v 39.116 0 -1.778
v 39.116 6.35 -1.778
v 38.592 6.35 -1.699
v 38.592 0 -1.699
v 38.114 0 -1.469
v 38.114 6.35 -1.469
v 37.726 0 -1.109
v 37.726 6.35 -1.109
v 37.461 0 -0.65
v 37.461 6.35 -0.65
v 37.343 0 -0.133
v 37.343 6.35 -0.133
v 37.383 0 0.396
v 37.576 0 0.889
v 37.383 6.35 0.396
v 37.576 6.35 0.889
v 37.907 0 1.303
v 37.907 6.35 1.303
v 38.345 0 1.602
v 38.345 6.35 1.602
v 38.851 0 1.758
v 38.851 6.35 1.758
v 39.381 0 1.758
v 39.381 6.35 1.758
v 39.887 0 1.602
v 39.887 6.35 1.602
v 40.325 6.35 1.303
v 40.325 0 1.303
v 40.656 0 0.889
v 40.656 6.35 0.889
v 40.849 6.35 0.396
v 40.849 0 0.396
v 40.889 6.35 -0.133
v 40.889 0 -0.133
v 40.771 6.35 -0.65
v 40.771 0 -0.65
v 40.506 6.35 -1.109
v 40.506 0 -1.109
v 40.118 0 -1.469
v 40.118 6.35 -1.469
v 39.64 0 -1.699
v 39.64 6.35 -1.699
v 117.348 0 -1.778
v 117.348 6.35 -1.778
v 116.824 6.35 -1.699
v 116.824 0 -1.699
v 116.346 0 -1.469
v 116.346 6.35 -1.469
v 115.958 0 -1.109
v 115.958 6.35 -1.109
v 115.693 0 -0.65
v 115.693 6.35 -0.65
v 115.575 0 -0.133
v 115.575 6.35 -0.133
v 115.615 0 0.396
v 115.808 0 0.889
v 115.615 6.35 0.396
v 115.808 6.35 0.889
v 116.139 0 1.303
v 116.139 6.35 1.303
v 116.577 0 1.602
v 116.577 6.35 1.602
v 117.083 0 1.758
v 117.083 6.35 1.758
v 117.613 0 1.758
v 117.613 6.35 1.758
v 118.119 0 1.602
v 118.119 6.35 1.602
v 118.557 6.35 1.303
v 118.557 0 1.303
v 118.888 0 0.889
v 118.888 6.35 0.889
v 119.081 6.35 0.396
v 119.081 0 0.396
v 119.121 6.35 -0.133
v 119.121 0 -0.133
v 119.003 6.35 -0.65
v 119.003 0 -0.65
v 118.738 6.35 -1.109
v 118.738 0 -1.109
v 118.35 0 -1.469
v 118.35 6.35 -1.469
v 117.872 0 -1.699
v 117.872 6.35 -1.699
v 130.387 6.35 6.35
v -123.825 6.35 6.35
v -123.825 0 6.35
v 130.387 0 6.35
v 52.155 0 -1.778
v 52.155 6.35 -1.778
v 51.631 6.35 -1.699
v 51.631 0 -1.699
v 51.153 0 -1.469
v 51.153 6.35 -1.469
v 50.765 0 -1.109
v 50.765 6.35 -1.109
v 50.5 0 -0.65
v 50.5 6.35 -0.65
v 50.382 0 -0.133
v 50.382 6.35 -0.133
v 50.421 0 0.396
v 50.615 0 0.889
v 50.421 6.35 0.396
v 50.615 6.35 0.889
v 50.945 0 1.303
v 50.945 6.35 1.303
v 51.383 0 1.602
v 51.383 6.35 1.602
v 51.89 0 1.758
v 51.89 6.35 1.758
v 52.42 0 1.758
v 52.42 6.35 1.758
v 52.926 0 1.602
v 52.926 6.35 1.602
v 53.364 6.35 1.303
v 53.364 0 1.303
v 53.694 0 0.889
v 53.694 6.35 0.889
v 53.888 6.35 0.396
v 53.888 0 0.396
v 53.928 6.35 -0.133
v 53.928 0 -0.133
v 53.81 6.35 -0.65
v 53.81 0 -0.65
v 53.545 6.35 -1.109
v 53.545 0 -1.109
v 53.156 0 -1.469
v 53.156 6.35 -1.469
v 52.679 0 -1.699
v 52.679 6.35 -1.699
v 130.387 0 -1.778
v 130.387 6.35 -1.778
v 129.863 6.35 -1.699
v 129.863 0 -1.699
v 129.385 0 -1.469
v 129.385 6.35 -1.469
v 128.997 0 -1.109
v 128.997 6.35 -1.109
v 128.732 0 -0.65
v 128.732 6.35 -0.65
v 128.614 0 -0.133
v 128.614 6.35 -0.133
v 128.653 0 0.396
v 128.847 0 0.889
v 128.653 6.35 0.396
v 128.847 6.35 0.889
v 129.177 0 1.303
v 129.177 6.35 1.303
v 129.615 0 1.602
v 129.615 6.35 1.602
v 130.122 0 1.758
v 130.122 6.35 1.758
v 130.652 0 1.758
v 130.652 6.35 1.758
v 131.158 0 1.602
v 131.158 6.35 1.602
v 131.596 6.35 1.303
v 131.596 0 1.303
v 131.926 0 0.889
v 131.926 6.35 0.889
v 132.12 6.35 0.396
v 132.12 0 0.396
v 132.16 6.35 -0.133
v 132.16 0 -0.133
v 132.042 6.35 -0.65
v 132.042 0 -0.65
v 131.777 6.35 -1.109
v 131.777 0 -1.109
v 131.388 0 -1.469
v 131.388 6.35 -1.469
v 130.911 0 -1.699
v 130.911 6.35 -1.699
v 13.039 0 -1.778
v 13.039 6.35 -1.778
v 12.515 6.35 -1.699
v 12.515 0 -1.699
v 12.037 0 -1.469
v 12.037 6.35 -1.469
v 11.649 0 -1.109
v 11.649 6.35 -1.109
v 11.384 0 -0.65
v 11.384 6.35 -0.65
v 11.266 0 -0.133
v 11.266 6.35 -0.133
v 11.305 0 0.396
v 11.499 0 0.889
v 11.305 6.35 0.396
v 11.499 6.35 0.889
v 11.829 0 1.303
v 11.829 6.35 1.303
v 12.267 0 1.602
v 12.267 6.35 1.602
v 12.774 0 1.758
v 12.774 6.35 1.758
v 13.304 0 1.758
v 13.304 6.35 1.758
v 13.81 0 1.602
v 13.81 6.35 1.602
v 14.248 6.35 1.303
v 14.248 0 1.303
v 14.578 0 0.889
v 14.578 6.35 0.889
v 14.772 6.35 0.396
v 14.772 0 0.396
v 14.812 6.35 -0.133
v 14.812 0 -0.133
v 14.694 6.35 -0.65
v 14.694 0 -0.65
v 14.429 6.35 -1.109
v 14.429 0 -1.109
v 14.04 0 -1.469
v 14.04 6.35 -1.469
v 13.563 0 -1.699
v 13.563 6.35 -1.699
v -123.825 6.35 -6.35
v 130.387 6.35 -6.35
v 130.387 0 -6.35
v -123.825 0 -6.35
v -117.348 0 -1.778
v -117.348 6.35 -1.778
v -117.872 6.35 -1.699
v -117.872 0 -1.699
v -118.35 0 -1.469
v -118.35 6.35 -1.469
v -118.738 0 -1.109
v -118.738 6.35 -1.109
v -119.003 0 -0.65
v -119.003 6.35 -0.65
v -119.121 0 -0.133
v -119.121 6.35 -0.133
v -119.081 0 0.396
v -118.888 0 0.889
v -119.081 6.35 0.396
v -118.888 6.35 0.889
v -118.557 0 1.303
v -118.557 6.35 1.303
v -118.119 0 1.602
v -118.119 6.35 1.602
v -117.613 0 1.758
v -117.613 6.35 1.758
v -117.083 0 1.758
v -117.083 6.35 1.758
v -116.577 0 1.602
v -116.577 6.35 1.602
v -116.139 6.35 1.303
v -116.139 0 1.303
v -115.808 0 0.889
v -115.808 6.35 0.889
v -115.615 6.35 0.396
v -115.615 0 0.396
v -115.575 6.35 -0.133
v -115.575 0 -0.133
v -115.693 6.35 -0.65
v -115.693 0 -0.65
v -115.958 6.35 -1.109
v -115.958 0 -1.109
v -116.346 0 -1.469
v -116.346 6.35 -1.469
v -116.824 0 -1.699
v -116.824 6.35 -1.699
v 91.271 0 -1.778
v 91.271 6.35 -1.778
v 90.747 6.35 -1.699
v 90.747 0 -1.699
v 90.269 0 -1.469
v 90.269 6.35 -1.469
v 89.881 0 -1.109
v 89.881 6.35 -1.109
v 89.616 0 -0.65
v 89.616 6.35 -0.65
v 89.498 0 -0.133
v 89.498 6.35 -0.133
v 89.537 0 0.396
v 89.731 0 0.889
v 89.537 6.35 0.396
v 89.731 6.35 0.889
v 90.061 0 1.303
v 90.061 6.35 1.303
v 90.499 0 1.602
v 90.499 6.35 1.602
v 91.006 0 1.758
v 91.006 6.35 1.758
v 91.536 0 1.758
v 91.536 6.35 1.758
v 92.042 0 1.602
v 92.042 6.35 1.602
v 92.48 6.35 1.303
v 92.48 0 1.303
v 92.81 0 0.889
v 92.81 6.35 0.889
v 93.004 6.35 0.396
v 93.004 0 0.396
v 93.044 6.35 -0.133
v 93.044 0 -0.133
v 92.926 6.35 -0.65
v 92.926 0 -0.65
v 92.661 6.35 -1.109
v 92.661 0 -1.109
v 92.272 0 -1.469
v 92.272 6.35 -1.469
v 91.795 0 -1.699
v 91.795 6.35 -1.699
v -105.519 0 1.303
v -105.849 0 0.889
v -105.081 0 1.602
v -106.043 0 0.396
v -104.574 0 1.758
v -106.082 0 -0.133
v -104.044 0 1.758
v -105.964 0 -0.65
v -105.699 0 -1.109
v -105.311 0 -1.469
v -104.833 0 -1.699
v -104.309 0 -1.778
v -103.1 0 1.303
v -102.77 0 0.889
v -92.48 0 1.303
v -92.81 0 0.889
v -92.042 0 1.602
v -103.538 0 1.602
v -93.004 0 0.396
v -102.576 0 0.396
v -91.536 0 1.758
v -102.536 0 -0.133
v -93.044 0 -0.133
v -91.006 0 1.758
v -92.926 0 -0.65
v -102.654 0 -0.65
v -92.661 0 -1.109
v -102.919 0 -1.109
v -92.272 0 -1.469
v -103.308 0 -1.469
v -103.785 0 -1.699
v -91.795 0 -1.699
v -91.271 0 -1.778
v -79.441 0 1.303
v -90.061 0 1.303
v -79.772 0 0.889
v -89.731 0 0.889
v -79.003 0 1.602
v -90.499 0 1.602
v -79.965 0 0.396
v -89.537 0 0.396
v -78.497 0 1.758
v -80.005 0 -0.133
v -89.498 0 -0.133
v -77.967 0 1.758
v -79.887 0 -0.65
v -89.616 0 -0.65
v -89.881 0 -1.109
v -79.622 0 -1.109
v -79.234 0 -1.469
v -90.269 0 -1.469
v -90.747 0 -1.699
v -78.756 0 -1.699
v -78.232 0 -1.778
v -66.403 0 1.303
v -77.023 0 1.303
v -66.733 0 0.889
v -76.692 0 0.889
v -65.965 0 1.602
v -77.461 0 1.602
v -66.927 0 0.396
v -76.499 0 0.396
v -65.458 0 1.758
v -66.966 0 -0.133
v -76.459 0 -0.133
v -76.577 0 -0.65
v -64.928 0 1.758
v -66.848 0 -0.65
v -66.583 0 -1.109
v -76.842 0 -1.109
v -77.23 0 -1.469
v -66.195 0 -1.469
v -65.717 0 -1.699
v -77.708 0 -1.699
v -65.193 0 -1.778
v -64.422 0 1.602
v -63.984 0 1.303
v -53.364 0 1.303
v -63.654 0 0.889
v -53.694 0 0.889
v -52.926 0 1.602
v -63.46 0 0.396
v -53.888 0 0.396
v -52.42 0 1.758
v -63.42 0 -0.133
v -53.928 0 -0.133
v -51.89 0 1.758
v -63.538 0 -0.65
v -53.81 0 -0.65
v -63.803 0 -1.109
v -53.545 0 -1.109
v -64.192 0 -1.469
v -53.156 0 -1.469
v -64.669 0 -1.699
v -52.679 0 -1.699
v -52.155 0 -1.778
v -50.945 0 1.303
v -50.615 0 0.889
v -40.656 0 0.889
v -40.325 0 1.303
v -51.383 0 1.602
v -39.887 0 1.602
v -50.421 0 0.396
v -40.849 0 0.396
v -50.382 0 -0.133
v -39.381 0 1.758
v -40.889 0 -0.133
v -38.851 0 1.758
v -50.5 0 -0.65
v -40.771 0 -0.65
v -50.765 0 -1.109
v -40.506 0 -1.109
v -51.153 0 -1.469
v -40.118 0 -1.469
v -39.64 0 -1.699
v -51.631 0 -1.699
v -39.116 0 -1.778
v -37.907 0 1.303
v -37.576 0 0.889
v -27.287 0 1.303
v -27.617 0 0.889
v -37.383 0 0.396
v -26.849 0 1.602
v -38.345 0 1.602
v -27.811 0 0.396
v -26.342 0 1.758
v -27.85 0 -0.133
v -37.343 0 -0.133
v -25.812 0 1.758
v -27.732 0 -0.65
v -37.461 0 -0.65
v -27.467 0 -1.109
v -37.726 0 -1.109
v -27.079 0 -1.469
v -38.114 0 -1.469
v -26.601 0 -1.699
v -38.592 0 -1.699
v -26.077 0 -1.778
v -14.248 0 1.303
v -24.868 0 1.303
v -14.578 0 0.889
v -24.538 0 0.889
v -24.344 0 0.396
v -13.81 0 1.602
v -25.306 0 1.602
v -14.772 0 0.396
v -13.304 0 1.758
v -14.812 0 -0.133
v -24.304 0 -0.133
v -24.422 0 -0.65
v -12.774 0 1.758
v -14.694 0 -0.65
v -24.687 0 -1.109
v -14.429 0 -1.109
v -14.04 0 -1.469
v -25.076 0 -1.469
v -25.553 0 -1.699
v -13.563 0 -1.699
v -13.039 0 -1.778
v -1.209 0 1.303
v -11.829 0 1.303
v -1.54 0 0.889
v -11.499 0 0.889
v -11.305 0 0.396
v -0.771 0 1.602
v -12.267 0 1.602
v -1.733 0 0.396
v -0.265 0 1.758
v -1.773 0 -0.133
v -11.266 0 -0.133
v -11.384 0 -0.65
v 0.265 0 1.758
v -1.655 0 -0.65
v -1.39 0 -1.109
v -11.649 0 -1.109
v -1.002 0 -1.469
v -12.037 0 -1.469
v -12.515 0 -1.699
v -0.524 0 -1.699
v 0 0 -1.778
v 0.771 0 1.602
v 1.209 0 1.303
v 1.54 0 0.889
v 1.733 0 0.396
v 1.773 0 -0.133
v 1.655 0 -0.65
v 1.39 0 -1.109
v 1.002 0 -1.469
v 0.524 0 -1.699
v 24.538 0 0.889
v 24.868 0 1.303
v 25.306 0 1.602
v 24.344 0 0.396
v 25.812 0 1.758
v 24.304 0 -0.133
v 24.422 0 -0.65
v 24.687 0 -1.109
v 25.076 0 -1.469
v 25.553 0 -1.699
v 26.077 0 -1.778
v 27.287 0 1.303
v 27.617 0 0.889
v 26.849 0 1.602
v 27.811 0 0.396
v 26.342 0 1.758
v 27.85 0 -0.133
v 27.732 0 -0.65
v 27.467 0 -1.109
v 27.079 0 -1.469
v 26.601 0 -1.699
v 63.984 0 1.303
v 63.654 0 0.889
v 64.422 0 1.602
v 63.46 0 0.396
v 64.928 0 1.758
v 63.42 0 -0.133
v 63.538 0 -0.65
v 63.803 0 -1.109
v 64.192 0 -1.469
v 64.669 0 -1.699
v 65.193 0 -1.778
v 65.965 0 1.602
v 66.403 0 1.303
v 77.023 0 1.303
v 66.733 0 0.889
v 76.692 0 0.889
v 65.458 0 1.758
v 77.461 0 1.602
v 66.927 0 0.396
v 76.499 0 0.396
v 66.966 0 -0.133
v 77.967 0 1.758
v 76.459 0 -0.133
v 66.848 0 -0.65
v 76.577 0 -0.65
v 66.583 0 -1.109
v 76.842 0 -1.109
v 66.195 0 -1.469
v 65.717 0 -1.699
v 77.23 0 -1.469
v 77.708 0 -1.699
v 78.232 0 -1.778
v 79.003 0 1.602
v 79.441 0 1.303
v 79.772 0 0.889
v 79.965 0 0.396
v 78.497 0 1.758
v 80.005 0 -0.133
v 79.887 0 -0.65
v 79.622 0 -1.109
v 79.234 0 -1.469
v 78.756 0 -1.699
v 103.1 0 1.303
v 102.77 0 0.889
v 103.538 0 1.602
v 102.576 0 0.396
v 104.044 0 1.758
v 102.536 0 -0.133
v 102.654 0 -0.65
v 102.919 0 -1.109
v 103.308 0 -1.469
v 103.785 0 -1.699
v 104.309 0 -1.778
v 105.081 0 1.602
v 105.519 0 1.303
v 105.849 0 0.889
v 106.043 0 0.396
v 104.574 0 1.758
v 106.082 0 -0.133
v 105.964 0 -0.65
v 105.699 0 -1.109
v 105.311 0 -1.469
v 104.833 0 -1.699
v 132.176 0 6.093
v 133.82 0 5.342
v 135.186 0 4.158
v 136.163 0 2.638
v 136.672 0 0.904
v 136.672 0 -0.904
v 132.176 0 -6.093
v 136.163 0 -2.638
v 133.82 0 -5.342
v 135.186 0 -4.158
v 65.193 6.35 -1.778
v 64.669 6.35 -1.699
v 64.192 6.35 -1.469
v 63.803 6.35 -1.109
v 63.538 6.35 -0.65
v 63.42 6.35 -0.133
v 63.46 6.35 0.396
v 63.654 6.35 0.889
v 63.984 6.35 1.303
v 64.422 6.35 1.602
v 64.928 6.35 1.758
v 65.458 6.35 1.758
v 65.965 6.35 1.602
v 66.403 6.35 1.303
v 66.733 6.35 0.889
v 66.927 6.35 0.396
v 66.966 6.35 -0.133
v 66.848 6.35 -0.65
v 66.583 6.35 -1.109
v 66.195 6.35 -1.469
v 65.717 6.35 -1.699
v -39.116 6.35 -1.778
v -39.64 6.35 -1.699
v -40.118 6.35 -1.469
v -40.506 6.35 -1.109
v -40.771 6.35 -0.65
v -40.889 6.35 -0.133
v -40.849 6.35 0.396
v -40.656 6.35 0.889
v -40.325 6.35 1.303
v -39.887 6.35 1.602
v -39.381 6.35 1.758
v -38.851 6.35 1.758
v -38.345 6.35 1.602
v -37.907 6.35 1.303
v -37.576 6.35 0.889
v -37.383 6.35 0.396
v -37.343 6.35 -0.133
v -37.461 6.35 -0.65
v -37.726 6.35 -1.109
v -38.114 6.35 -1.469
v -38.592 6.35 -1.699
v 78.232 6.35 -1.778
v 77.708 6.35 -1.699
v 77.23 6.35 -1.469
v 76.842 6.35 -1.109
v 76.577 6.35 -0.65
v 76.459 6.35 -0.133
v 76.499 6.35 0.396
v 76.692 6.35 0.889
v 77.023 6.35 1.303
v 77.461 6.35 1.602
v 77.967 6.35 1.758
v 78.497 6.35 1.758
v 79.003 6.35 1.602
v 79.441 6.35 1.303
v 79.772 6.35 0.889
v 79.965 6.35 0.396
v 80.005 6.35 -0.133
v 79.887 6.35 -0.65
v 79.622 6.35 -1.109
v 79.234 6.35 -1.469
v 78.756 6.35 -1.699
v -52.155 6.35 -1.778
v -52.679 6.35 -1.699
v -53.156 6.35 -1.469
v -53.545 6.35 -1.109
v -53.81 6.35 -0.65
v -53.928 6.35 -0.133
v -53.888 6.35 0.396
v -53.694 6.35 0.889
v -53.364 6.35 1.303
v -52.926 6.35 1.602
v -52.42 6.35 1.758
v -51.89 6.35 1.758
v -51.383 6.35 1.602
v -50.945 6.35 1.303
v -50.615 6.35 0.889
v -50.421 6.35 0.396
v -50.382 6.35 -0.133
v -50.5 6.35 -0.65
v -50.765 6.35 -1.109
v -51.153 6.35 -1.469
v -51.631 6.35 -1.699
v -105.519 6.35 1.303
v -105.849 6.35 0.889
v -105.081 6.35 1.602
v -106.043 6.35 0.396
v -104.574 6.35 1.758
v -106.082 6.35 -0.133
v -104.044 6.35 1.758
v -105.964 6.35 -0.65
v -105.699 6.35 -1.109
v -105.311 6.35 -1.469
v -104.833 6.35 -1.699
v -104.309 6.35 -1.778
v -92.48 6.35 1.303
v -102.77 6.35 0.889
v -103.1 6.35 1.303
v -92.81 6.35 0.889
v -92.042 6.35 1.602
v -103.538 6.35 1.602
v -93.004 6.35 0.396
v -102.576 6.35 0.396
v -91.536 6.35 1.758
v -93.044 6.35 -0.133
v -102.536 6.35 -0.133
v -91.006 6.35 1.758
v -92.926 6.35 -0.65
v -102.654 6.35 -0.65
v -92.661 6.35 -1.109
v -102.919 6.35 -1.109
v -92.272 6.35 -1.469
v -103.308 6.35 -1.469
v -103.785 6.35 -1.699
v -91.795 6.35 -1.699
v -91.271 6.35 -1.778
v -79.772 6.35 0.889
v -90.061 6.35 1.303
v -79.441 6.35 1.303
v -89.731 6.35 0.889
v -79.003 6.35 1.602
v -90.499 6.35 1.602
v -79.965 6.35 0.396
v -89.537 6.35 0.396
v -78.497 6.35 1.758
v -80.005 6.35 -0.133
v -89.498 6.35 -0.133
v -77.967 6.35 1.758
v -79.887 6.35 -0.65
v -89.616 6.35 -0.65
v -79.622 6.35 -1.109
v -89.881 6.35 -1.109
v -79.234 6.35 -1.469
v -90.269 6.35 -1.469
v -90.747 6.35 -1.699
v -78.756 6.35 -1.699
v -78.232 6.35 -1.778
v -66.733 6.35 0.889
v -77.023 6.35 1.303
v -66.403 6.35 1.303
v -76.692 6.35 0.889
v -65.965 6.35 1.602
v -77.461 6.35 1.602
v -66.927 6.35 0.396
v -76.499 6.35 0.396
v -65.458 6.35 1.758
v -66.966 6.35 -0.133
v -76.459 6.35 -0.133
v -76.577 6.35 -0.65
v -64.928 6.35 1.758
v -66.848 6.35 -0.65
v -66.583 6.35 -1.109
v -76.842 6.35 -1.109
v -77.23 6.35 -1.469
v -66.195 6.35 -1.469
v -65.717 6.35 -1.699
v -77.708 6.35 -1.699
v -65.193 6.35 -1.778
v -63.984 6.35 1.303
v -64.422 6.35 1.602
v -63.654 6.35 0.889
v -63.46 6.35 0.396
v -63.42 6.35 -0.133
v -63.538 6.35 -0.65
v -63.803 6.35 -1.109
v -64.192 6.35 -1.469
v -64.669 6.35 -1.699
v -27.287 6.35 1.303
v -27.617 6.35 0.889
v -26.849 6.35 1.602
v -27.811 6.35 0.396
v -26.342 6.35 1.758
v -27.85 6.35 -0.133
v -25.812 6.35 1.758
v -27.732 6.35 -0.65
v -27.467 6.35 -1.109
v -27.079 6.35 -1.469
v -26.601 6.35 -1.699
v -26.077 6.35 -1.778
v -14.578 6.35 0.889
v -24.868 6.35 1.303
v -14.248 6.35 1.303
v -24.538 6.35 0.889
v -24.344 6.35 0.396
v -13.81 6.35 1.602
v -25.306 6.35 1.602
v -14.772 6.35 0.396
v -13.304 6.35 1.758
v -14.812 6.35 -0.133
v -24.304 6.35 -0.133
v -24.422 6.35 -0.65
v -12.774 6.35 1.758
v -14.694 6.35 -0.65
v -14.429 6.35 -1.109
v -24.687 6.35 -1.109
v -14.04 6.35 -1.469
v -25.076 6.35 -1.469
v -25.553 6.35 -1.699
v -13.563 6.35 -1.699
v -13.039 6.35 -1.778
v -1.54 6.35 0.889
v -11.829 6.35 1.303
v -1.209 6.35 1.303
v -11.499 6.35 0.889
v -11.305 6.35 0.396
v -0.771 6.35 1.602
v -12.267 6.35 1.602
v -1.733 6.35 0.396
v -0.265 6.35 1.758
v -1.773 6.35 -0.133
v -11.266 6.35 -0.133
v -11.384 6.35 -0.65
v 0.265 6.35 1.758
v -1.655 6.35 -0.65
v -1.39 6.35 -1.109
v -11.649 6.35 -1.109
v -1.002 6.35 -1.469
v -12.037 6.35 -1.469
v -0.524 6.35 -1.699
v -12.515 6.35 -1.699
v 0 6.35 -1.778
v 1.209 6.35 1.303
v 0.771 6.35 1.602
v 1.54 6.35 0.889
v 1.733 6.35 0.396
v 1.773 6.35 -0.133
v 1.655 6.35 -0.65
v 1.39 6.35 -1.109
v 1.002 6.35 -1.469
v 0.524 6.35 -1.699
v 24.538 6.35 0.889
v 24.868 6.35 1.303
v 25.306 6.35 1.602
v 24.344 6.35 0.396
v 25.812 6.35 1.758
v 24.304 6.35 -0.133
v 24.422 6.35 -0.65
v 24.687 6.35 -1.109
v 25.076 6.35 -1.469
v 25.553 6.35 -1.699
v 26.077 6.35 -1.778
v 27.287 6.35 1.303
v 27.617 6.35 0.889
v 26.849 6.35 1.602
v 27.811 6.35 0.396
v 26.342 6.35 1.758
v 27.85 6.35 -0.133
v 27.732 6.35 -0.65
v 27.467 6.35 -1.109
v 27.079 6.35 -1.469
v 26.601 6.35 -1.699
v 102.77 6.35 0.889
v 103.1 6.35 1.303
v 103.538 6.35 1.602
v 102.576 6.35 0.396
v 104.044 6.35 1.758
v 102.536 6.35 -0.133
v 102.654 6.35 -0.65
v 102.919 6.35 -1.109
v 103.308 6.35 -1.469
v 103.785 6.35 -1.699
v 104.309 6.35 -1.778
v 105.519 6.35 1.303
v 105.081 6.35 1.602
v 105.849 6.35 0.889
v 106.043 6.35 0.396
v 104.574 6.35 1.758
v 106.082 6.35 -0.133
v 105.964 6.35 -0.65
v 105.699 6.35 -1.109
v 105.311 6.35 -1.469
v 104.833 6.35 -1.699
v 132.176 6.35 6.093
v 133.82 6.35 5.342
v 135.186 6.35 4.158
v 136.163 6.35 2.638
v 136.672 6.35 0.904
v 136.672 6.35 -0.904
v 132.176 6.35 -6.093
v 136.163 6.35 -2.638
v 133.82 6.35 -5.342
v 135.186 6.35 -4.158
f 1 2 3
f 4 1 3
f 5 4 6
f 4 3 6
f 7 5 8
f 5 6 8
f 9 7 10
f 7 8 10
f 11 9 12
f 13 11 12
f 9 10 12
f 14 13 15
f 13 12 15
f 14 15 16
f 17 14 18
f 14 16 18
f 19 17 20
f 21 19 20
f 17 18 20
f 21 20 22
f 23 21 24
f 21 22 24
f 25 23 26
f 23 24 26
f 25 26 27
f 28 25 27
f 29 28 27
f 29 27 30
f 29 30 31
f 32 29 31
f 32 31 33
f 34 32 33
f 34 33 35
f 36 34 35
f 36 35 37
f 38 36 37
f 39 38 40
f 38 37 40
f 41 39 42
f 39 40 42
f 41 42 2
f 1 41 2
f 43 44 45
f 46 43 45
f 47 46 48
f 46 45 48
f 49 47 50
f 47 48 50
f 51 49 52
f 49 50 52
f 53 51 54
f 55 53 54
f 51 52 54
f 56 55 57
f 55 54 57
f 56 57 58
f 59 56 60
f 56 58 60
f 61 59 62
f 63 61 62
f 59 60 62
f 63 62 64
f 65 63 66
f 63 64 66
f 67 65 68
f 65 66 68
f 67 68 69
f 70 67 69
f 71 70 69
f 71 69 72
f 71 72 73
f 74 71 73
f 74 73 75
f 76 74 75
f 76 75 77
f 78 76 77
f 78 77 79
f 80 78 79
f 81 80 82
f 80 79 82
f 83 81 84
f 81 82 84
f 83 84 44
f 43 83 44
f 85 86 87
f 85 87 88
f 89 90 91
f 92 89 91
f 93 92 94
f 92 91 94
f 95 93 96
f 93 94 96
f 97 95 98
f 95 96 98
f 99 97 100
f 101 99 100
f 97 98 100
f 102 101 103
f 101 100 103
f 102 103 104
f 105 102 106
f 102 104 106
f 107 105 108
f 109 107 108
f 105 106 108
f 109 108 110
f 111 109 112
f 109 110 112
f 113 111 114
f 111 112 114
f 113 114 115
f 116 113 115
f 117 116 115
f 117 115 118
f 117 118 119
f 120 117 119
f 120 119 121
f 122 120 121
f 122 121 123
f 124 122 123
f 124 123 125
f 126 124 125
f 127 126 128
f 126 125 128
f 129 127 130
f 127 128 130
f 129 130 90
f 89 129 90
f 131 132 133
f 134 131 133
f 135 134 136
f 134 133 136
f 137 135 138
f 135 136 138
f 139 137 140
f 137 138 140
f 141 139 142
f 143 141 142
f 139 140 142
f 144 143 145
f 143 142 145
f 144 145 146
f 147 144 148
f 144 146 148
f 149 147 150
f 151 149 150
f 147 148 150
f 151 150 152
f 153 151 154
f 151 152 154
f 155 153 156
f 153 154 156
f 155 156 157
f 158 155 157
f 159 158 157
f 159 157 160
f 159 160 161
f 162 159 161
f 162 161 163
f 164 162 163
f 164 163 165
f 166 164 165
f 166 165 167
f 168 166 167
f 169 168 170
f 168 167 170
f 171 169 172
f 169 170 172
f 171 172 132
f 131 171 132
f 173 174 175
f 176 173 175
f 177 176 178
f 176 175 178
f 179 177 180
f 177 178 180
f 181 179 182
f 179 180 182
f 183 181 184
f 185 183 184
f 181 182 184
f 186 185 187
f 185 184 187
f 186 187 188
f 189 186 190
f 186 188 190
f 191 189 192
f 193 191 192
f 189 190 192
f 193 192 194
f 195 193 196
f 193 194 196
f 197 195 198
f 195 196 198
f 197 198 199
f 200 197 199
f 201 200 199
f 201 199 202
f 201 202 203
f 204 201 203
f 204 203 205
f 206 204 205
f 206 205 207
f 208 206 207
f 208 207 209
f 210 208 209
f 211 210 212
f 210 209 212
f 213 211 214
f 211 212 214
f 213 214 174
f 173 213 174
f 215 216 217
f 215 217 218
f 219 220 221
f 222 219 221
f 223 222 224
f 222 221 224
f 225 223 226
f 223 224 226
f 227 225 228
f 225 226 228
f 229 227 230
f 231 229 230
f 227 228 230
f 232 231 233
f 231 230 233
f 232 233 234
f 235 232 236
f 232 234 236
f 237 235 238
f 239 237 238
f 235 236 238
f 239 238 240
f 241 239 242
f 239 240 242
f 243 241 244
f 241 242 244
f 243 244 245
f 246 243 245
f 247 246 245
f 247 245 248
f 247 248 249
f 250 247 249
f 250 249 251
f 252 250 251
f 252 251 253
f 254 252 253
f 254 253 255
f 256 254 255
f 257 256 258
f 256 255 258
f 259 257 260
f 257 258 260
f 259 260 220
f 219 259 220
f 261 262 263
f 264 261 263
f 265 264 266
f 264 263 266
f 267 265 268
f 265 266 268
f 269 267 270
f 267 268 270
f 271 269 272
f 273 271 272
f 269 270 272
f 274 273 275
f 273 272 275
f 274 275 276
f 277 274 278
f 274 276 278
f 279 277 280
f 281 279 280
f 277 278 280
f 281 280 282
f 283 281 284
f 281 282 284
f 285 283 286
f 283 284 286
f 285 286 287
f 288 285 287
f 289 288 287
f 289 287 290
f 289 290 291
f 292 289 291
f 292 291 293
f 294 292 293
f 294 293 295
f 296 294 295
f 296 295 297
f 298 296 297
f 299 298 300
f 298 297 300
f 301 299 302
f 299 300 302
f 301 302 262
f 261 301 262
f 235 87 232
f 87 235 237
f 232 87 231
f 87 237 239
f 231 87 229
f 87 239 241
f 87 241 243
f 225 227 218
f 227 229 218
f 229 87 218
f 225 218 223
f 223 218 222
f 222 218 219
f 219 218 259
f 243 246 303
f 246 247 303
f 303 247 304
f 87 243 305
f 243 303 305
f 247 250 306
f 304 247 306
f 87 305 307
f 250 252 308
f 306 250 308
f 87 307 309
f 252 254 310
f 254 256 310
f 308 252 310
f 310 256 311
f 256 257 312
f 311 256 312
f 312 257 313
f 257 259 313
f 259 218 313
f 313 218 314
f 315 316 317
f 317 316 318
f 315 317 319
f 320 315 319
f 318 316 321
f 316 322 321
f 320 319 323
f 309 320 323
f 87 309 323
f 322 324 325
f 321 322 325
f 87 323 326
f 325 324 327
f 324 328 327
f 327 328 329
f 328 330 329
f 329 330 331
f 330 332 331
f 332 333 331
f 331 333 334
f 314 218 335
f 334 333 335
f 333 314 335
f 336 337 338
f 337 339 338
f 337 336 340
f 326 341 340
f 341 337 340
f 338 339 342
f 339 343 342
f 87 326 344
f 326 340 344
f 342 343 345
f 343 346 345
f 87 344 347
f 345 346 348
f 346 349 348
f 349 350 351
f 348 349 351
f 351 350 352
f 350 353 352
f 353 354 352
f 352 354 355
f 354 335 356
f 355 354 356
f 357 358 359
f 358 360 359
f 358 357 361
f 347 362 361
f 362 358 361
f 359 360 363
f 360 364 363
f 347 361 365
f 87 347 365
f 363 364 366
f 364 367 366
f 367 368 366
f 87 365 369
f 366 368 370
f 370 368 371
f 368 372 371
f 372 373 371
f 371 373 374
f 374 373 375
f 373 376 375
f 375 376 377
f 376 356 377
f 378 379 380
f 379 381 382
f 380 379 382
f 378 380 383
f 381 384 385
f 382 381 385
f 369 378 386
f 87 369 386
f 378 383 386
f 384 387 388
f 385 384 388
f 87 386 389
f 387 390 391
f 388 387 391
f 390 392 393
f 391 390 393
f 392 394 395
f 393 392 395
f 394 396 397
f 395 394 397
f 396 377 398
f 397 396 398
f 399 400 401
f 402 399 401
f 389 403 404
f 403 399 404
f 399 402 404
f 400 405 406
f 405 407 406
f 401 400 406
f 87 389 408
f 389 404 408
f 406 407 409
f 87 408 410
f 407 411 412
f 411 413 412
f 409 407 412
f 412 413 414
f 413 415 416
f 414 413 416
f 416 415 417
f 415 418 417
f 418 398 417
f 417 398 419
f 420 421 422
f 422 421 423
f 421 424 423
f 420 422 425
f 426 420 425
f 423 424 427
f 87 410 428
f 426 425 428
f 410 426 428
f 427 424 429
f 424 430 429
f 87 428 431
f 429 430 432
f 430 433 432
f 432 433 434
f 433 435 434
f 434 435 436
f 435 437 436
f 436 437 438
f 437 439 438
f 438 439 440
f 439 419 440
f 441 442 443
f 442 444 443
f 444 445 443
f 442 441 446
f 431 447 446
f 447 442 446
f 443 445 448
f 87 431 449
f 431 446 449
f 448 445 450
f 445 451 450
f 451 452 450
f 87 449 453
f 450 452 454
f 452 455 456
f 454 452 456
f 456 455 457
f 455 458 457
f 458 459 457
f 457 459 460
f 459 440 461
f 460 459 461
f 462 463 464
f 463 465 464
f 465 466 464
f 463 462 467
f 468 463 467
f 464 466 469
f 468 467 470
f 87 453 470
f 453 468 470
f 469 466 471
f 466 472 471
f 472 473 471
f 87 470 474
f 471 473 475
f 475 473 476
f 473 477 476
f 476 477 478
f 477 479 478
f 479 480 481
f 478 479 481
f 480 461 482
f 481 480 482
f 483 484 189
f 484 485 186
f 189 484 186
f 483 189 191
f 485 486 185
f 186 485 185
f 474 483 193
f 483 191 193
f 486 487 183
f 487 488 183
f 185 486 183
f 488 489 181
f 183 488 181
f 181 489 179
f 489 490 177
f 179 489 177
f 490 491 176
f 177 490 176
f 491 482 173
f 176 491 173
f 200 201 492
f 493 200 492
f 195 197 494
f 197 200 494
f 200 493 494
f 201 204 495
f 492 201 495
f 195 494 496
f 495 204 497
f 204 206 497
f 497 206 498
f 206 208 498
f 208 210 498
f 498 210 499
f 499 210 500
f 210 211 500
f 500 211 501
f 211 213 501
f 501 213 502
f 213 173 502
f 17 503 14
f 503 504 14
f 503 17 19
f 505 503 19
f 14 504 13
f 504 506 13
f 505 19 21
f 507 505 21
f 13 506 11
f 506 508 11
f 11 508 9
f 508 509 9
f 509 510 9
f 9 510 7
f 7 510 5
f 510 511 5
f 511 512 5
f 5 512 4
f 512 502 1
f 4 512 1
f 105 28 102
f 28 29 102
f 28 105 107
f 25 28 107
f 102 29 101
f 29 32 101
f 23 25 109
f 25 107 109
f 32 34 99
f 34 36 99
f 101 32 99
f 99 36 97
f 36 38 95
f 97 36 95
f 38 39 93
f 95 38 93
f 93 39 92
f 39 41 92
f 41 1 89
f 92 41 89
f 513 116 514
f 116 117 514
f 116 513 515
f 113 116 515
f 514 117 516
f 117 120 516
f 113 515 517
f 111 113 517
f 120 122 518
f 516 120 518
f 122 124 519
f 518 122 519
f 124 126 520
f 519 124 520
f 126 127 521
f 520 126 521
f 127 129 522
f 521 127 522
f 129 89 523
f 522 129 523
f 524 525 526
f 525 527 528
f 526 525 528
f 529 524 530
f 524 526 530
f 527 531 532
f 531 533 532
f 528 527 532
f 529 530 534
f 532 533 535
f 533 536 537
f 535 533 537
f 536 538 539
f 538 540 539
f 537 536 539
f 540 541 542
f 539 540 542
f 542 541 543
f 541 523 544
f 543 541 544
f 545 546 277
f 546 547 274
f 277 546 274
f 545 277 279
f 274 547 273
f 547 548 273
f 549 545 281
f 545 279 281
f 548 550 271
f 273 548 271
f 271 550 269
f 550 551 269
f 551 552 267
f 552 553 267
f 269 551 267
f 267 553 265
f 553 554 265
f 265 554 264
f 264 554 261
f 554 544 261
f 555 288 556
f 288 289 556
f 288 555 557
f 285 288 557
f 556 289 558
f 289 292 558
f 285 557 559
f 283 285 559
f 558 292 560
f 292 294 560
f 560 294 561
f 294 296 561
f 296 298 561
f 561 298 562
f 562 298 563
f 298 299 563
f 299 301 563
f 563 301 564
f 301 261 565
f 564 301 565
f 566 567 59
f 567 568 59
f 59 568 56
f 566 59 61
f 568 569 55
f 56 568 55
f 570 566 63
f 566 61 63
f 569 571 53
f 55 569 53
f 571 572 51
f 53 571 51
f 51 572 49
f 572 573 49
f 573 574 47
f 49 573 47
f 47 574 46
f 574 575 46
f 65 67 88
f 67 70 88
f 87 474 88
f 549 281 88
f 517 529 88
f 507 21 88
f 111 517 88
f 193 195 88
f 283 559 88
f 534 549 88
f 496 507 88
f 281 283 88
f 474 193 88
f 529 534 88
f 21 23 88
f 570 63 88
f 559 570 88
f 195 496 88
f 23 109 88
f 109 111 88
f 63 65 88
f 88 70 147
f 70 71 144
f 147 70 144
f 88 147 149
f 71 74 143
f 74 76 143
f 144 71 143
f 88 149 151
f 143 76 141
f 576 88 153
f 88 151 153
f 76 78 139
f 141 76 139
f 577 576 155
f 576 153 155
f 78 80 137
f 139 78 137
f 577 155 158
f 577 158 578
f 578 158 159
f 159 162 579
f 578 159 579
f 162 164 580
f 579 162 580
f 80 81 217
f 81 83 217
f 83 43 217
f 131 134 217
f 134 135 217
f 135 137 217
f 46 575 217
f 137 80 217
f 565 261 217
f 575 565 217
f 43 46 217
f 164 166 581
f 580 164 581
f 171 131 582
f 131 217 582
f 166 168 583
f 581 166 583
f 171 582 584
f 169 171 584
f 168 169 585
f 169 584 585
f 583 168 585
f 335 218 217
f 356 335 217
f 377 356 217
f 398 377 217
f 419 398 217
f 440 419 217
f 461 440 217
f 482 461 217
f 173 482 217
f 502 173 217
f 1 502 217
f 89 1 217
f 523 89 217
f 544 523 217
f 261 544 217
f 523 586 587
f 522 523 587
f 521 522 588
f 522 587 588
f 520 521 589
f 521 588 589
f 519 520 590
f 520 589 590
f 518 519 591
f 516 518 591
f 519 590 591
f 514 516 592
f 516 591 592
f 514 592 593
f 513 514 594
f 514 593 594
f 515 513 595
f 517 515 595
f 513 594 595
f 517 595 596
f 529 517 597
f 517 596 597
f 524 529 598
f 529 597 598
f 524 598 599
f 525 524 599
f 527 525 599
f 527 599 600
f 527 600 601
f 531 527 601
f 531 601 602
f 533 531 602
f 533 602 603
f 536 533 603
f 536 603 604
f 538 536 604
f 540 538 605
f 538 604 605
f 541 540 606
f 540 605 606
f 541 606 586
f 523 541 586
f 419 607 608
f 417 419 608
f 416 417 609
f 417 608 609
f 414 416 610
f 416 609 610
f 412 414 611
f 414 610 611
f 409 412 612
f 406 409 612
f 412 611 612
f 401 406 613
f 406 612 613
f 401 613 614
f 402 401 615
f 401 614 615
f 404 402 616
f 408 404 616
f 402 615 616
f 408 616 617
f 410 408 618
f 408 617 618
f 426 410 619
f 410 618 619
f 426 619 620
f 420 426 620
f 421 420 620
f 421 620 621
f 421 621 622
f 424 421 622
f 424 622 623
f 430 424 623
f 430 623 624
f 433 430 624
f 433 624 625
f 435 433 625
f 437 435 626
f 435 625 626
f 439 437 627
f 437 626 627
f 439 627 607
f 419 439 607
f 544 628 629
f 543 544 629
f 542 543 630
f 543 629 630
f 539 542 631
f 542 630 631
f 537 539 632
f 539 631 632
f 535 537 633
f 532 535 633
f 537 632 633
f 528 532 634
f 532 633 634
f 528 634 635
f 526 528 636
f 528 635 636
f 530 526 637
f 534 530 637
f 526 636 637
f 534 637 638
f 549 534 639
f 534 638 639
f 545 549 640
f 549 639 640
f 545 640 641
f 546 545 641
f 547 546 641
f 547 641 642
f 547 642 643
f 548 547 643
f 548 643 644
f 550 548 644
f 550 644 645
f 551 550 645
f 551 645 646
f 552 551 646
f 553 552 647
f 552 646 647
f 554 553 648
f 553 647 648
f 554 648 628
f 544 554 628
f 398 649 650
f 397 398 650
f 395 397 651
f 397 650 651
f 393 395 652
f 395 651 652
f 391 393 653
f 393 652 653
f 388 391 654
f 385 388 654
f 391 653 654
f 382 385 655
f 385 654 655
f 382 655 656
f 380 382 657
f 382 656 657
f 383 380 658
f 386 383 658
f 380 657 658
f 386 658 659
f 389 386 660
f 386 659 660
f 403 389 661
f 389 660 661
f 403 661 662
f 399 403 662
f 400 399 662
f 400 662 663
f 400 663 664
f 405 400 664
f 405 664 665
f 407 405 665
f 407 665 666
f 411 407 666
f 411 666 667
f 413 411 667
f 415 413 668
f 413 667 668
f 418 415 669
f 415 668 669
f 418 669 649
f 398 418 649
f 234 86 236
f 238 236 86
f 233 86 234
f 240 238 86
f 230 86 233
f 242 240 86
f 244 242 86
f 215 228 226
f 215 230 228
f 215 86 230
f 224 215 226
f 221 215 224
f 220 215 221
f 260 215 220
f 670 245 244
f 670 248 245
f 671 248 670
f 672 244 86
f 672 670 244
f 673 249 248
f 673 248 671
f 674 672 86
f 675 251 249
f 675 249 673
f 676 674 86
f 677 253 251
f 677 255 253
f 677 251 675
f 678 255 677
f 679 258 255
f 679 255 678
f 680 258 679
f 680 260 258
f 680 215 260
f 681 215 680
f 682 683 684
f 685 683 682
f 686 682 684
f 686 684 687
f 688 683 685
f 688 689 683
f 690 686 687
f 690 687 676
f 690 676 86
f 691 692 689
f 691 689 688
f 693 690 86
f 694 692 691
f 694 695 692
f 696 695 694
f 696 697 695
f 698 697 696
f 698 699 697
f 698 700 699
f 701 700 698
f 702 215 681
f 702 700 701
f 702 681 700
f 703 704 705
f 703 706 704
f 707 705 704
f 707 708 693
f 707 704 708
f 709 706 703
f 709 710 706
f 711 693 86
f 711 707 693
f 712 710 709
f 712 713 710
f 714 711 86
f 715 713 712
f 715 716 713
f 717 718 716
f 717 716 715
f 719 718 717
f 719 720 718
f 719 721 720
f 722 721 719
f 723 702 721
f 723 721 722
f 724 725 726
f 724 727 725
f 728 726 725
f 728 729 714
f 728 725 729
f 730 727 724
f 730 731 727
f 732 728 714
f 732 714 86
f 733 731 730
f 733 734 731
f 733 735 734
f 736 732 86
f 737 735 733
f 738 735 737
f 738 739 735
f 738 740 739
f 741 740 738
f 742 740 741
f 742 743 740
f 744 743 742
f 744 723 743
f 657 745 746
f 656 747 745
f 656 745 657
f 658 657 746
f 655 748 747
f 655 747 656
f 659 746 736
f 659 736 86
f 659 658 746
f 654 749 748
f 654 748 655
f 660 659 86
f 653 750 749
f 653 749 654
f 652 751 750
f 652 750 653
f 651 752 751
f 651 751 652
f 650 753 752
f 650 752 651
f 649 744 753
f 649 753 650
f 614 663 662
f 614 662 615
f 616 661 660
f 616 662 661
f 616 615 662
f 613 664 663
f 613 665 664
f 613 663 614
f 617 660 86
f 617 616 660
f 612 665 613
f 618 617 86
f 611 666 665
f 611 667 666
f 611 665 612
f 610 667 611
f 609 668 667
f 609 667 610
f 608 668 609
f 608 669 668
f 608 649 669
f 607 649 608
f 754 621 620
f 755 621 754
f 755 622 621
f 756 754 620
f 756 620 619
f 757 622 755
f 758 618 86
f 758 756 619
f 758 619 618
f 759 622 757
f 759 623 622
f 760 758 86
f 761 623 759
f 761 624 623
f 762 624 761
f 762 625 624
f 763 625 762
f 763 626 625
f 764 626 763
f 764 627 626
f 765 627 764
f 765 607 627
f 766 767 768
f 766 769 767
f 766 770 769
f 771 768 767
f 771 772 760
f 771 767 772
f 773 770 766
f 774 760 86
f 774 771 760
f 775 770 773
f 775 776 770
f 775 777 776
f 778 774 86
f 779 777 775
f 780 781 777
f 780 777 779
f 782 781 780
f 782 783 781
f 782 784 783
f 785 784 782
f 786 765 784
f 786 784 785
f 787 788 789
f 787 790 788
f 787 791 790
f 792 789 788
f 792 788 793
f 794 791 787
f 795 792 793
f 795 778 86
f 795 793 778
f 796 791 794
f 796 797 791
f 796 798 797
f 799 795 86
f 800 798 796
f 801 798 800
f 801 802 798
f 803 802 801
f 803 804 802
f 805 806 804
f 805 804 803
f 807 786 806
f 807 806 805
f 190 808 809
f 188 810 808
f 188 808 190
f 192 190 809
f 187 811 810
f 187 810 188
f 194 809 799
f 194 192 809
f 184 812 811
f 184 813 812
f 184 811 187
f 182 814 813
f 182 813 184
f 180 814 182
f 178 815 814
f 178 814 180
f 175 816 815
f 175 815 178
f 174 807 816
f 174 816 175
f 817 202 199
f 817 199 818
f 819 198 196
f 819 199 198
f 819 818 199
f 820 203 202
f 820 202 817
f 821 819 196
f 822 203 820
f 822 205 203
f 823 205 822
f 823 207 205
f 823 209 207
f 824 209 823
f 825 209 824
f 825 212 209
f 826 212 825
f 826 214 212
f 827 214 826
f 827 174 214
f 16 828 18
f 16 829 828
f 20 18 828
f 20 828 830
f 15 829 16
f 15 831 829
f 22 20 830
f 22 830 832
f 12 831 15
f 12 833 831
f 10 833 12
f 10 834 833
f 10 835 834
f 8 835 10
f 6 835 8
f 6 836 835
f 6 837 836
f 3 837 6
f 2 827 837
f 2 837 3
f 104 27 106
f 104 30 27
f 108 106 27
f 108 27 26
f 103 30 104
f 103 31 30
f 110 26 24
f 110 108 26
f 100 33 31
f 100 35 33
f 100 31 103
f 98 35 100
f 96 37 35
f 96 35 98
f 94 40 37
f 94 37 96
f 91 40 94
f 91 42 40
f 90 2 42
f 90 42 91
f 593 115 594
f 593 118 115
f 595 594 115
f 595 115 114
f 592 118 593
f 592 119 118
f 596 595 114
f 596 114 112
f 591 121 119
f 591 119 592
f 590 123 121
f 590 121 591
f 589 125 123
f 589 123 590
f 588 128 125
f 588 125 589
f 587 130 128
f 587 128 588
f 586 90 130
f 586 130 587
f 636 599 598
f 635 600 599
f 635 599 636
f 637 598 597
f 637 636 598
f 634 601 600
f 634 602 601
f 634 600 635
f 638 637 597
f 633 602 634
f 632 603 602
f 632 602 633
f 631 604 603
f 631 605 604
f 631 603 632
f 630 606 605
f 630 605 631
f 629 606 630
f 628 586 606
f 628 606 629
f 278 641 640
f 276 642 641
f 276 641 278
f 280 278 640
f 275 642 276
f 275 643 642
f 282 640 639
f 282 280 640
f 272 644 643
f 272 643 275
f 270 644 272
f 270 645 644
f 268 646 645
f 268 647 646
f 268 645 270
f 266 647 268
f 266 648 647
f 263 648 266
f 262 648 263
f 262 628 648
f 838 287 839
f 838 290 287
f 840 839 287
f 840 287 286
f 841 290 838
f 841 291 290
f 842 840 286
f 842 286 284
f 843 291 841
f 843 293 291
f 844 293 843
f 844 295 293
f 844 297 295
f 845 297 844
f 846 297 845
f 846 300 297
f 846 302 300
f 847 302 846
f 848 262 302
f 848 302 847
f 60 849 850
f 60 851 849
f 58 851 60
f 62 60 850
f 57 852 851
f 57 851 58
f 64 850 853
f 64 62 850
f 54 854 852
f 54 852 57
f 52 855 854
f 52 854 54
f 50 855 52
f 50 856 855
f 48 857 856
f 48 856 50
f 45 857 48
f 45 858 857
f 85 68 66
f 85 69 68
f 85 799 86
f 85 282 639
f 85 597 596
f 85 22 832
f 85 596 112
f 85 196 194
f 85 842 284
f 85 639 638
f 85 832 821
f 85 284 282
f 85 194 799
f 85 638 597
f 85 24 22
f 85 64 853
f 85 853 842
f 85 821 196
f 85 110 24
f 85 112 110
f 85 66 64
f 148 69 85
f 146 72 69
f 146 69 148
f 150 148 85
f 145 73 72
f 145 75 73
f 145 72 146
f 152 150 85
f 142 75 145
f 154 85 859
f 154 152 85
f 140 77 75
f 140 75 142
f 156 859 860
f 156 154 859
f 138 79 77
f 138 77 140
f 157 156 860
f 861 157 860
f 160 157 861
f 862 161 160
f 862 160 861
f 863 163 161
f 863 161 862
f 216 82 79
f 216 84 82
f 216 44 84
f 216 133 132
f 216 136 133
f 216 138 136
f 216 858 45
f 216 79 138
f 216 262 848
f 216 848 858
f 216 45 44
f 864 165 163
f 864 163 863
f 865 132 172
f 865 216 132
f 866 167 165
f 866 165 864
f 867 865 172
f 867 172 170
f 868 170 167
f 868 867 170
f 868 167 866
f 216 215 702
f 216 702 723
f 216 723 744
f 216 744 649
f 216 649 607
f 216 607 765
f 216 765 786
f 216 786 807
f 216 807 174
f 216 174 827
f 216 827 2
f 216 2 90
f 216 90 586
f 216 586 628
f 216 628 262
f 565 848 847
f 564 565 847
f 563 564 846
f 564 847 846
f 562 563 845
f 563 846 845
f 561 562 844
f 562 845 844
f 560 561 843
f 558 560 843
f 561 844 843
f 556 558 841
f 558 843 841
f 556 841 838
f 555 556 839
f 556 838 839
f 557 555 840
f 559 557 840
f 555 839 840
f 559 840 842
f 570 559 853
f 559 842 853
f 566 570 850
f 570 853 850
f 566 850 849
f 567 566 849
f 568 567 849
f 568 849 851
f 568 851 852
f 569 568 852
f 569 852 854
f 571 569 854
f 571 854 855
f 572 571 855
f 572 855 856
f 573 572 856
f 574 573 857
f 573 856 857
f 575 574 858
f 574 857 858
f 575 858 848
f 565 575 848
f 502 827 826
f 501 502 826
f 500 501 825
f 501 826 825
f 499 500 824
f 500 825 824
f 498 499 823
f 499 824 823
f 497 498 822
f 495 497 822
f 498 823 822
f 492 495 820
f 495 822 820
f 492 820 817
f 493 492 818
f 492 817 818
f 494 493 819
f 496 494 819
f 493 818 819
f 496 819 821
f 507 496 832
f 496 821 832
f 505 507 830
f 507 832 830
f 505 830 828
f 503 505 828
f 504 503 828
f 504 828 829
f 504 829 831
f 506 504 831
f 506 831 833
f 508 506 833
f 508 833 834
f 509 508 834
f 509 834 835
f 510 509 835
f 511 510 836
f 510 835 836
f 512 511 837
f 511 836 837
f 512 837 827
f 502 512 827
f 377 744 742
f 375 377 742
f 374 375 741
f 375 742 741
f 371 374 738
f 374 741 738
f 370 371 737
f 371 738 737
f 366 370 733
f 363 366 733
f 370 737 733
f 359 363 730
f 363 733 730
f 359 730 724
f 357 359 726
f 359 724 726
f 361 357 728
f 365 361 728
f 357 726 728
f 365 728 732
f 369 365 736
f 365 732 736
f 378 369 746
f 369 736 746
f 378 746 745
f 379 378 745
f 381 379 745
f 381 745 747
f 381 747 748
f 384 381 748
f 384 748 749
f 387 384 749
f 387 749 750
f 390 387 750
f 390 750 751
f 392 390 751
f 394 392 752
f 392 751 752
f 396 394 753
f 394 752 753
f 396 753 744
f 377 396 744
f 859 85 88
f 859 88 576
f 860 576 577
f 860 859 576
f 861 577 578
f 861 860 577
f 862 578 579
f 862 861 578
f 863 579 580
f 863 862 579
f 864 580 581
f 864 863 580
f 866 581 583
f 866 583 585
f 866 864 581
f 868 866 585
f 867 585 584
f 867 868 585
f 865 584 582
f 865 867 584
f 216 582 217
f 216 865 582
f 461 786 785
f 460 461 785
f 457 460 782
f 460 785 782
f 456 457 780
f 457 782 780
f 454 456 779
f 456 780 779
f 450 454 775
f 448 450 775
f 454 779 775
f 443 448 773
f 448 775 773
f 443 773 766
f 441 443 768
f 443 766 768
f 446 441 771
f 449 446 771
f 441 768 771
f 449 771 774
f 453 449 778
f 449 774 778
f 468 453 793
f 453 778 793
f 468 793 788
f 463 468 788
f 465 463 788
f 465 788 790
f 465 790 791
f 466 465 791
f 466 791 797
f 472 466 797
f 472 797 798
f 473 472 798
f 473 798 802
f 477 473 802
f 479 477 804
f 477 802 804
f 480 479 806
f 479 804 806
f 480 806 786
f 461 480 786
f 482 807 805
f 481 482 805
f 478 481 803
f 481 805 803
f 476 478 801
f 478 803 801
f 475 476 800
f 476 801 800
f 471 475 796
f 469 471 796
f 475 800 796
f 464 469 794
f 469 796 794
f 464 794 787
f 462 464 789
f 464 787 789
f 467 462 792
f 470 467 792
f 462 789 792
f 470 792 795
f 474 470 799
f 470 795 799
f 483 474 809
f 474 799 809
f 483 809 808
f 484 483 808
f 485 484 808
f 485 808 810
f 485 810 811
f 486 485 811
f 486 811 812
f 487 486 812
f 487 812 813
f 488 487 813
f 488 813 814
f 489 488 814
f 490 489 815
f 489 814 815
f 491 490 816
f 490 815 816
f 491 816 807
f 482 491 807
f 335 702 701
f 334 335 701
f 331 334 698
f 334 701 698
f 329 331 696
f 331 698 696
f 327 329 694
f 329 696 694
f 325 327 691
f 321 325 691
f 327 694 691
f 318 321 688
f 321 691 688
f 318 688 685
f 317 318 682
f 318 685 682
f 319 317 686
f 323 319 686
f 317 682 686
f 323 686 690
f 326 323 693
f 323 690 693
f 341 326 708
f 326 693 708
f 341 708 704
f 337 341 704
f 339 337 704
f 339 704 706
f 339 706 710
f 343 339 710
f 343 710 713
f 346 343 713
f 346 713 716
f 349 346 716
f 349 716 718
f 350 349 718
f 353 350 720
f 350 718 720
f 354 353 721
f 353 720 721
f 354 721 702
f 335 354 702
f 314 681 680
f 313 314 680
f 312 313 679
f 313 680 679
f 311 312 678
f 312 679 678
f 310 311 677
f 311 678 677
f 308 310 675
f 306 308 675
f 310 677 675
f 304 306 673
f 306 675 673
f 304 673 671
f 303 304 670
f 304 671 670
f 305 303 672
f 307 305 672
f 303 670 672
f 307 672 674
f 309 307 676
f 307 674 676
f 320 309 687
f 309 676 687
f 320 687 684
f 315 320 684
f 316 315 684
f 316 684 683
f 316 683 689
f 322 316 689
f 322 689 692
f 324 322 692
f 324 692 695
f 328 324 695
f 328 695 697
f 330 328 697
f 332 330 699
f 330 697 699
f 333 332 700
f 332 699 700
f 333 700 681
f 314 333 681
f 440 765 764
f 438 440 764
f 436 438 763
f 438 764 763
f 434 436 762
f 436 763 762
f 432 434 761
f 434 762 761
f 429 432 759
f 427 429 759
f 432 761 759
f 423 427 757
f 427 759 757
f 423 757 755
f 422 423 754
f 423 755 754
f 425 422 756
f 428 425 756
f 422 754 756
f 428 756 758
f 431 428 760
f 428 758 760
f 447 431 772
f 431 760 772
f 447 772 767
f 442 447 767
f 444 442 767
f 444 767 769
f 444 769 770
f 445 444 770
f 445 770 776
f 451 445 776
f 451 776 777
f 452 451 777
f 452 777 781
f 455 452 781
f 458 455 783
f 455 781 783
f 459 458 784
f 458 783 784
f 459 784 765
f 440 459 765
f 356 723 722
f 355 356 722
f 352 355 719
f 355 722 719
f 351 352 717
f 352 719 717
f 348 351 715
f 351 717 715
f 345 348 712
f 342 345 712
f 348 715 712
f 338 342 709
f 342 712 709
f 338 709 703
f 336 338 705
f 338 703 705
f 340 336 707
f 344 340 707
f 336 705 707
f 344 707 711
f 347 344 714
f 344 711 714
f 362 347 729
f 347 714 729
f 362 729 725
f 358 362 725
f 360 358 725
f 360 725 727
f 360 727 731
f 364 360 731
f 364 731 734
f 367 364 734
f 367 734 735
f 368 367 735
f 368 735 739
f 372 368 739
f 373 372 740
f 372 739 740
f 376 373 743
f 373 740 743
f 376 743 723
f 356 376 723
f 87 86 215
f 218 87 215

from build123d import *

# Parameters (mm, degrees)
SKETCH1_R           = 1.778
BOSS_EXTRUDE1_DEPTH = 6.35
SKETCH2_W           = 19.47523672
SKETCH2_H           = 16.524840043
CUT_EXTRUDE1_DEPTH  = 10.16


with BuildPart() as part:
    # Sketch1 → Boss-Extrude1 (new body)
    with BuildSketch(Plane(origin=(0, 6.35, 0), x_dir=(1, 0, 0), z_dir=(0, 1, 0))):
        with BuildLine():
            Line((130.386666667, 6.35), (-130.386666667, 6.35))
            ThreePointArc((-130.386666667, 6.35), (-136.736666667, 0), (-130.386666667, -6.35))
            Line((-130.386666667, -6.35), (130.386666667, -6.35))
            ThreePointArc((130.386666667, -6.35), (136.736666667, 0), (130.386666667, 6.35))
        make_face()
        with Locations(Location((130.386666667, 0, 0), (0, 0, 90))):
            Circle(SKETCH1_R, mode=Mode.SUBTRACT)
        with Locations(Location((117.348, 0, 0), (0, 0, 90))):
            Circle(SKETCH1_R, mode=Mode.SUBTRACT)
        with Locations(Location((104.309333333, 0, 0), (0, 0, 90))):
            Circle(SKETCH1_R, mode=Mode.SUBTRACT)
        with Locations(Location((91.270666667, 0, 0), (0, 0, 90))):
            Circle(SKETCH1_R, mode=Mode.SUBTRACT)
        with Locations(Location((78.232, 0, 0), (0, 0, 90))):
            Circle(SKETCH1_R, mode=Mode.SUBTRACT)
        with Locations(Location((65.193333333, 0, 0), (0, 0, 90))):
            Circle(SKETCH1_R, mode=Mode.SUBTRACT)
        with Locations(Location((52.154666667, 0, 0), (0, 0, 90))):
            Circle(SKETCH1_R, mode=Mode.SUBTRACT)
        with Locations(Location((39.116, 0, 0), (0, 0, 90))):
            Circle(SKETCH1_R, mode=Mode.SUBTRACT)
        with Locations(Location((26.077333333, 0, 0), (0, 0, 90))):
            Circle(SKETCH1_R, mode=Mode.SUBTRACT)
        with Locations(Location((13.038666667, 0, 0), (0, 0, 90))):
            Circle(SKETCH1_R, mode=Mode.SUBTRACT)
        with Locations(Location((0, 0, 0), (0, 0, 90))):
            Circle(SKETCH1_R, mode=Mode.SUBTRACT)
        with Locations(Location((-13.038666667, 0, 0), (0, 0, 90))):
            Circle(SKETCH1_R, mode=Mode.SUBTRACT)
        with Locations(Location((-26.077333333, 0, 0), (0, 0, 90))):
            Circle(SKETCH1_R, mode=Mode.SUBTRACT)
        with Locations(Location((-39.116, 0, 0), (0, 0, 90))):
            Circle(SKETCH1_R, mode=Mode.SUBTRACT)
        with Locations(Location((-52.154666667, 0, 0), (0, 0, 90))):
            Circle(SKETCH1_R, mode=Mode.SUBTRACT)
        with Locations(Location((-65.193333333, 0, 0), (0, 0, 90))):
            Circle(SKETCH1_R, mode=Mode.SUBTRACT)
        with Locations(Location((-78.232, 0, 0), (0, 0, 90))):
            Circle(SKETCH1_R, mode=Mode.SUBTRACT)
        with Locations(Location((-91.270666667, 0, 0), (0, 0, 90))):
            Circle(SKETCH1_R, mode=Mode.SUBTRACT)
        with Locations(Location((-104.309333333, 0, 0), (0, 0, 90))):
            Circle(SKETCH1_R, mode=Mode.SUBTRACT)
        with Locations(Location((-117.348, 0, 0), (0, 0, 90))):
            Circle(SKETCH1_R, mode=Mode.SUBTRACT)
        with Locations(Location((-130.386666667, 0, 0), (0, 0, 90))):
            Circle(SKETCH1_R, mode=Mode.SUBTRACT)
    extrude(amount=-BOSS_EXTRUDE1_DEPTH)

    # Sketch2 → Cut-Extrude1 (cut)
    with BuildSketch(Plane(origin=(0, 6.35, 0), x_dir=(1, 0, 0), z_dir=(0, 1, 0))):
        with Locations((-133.562235071, -1.347885805)):
            Rectangle(SKETCH2_W, SKETCH2_H)
    extrude(amount=-CUT_EXTRUDE1_DEPTH, mode=Mode.SUBTRACT)


solid = part.part
